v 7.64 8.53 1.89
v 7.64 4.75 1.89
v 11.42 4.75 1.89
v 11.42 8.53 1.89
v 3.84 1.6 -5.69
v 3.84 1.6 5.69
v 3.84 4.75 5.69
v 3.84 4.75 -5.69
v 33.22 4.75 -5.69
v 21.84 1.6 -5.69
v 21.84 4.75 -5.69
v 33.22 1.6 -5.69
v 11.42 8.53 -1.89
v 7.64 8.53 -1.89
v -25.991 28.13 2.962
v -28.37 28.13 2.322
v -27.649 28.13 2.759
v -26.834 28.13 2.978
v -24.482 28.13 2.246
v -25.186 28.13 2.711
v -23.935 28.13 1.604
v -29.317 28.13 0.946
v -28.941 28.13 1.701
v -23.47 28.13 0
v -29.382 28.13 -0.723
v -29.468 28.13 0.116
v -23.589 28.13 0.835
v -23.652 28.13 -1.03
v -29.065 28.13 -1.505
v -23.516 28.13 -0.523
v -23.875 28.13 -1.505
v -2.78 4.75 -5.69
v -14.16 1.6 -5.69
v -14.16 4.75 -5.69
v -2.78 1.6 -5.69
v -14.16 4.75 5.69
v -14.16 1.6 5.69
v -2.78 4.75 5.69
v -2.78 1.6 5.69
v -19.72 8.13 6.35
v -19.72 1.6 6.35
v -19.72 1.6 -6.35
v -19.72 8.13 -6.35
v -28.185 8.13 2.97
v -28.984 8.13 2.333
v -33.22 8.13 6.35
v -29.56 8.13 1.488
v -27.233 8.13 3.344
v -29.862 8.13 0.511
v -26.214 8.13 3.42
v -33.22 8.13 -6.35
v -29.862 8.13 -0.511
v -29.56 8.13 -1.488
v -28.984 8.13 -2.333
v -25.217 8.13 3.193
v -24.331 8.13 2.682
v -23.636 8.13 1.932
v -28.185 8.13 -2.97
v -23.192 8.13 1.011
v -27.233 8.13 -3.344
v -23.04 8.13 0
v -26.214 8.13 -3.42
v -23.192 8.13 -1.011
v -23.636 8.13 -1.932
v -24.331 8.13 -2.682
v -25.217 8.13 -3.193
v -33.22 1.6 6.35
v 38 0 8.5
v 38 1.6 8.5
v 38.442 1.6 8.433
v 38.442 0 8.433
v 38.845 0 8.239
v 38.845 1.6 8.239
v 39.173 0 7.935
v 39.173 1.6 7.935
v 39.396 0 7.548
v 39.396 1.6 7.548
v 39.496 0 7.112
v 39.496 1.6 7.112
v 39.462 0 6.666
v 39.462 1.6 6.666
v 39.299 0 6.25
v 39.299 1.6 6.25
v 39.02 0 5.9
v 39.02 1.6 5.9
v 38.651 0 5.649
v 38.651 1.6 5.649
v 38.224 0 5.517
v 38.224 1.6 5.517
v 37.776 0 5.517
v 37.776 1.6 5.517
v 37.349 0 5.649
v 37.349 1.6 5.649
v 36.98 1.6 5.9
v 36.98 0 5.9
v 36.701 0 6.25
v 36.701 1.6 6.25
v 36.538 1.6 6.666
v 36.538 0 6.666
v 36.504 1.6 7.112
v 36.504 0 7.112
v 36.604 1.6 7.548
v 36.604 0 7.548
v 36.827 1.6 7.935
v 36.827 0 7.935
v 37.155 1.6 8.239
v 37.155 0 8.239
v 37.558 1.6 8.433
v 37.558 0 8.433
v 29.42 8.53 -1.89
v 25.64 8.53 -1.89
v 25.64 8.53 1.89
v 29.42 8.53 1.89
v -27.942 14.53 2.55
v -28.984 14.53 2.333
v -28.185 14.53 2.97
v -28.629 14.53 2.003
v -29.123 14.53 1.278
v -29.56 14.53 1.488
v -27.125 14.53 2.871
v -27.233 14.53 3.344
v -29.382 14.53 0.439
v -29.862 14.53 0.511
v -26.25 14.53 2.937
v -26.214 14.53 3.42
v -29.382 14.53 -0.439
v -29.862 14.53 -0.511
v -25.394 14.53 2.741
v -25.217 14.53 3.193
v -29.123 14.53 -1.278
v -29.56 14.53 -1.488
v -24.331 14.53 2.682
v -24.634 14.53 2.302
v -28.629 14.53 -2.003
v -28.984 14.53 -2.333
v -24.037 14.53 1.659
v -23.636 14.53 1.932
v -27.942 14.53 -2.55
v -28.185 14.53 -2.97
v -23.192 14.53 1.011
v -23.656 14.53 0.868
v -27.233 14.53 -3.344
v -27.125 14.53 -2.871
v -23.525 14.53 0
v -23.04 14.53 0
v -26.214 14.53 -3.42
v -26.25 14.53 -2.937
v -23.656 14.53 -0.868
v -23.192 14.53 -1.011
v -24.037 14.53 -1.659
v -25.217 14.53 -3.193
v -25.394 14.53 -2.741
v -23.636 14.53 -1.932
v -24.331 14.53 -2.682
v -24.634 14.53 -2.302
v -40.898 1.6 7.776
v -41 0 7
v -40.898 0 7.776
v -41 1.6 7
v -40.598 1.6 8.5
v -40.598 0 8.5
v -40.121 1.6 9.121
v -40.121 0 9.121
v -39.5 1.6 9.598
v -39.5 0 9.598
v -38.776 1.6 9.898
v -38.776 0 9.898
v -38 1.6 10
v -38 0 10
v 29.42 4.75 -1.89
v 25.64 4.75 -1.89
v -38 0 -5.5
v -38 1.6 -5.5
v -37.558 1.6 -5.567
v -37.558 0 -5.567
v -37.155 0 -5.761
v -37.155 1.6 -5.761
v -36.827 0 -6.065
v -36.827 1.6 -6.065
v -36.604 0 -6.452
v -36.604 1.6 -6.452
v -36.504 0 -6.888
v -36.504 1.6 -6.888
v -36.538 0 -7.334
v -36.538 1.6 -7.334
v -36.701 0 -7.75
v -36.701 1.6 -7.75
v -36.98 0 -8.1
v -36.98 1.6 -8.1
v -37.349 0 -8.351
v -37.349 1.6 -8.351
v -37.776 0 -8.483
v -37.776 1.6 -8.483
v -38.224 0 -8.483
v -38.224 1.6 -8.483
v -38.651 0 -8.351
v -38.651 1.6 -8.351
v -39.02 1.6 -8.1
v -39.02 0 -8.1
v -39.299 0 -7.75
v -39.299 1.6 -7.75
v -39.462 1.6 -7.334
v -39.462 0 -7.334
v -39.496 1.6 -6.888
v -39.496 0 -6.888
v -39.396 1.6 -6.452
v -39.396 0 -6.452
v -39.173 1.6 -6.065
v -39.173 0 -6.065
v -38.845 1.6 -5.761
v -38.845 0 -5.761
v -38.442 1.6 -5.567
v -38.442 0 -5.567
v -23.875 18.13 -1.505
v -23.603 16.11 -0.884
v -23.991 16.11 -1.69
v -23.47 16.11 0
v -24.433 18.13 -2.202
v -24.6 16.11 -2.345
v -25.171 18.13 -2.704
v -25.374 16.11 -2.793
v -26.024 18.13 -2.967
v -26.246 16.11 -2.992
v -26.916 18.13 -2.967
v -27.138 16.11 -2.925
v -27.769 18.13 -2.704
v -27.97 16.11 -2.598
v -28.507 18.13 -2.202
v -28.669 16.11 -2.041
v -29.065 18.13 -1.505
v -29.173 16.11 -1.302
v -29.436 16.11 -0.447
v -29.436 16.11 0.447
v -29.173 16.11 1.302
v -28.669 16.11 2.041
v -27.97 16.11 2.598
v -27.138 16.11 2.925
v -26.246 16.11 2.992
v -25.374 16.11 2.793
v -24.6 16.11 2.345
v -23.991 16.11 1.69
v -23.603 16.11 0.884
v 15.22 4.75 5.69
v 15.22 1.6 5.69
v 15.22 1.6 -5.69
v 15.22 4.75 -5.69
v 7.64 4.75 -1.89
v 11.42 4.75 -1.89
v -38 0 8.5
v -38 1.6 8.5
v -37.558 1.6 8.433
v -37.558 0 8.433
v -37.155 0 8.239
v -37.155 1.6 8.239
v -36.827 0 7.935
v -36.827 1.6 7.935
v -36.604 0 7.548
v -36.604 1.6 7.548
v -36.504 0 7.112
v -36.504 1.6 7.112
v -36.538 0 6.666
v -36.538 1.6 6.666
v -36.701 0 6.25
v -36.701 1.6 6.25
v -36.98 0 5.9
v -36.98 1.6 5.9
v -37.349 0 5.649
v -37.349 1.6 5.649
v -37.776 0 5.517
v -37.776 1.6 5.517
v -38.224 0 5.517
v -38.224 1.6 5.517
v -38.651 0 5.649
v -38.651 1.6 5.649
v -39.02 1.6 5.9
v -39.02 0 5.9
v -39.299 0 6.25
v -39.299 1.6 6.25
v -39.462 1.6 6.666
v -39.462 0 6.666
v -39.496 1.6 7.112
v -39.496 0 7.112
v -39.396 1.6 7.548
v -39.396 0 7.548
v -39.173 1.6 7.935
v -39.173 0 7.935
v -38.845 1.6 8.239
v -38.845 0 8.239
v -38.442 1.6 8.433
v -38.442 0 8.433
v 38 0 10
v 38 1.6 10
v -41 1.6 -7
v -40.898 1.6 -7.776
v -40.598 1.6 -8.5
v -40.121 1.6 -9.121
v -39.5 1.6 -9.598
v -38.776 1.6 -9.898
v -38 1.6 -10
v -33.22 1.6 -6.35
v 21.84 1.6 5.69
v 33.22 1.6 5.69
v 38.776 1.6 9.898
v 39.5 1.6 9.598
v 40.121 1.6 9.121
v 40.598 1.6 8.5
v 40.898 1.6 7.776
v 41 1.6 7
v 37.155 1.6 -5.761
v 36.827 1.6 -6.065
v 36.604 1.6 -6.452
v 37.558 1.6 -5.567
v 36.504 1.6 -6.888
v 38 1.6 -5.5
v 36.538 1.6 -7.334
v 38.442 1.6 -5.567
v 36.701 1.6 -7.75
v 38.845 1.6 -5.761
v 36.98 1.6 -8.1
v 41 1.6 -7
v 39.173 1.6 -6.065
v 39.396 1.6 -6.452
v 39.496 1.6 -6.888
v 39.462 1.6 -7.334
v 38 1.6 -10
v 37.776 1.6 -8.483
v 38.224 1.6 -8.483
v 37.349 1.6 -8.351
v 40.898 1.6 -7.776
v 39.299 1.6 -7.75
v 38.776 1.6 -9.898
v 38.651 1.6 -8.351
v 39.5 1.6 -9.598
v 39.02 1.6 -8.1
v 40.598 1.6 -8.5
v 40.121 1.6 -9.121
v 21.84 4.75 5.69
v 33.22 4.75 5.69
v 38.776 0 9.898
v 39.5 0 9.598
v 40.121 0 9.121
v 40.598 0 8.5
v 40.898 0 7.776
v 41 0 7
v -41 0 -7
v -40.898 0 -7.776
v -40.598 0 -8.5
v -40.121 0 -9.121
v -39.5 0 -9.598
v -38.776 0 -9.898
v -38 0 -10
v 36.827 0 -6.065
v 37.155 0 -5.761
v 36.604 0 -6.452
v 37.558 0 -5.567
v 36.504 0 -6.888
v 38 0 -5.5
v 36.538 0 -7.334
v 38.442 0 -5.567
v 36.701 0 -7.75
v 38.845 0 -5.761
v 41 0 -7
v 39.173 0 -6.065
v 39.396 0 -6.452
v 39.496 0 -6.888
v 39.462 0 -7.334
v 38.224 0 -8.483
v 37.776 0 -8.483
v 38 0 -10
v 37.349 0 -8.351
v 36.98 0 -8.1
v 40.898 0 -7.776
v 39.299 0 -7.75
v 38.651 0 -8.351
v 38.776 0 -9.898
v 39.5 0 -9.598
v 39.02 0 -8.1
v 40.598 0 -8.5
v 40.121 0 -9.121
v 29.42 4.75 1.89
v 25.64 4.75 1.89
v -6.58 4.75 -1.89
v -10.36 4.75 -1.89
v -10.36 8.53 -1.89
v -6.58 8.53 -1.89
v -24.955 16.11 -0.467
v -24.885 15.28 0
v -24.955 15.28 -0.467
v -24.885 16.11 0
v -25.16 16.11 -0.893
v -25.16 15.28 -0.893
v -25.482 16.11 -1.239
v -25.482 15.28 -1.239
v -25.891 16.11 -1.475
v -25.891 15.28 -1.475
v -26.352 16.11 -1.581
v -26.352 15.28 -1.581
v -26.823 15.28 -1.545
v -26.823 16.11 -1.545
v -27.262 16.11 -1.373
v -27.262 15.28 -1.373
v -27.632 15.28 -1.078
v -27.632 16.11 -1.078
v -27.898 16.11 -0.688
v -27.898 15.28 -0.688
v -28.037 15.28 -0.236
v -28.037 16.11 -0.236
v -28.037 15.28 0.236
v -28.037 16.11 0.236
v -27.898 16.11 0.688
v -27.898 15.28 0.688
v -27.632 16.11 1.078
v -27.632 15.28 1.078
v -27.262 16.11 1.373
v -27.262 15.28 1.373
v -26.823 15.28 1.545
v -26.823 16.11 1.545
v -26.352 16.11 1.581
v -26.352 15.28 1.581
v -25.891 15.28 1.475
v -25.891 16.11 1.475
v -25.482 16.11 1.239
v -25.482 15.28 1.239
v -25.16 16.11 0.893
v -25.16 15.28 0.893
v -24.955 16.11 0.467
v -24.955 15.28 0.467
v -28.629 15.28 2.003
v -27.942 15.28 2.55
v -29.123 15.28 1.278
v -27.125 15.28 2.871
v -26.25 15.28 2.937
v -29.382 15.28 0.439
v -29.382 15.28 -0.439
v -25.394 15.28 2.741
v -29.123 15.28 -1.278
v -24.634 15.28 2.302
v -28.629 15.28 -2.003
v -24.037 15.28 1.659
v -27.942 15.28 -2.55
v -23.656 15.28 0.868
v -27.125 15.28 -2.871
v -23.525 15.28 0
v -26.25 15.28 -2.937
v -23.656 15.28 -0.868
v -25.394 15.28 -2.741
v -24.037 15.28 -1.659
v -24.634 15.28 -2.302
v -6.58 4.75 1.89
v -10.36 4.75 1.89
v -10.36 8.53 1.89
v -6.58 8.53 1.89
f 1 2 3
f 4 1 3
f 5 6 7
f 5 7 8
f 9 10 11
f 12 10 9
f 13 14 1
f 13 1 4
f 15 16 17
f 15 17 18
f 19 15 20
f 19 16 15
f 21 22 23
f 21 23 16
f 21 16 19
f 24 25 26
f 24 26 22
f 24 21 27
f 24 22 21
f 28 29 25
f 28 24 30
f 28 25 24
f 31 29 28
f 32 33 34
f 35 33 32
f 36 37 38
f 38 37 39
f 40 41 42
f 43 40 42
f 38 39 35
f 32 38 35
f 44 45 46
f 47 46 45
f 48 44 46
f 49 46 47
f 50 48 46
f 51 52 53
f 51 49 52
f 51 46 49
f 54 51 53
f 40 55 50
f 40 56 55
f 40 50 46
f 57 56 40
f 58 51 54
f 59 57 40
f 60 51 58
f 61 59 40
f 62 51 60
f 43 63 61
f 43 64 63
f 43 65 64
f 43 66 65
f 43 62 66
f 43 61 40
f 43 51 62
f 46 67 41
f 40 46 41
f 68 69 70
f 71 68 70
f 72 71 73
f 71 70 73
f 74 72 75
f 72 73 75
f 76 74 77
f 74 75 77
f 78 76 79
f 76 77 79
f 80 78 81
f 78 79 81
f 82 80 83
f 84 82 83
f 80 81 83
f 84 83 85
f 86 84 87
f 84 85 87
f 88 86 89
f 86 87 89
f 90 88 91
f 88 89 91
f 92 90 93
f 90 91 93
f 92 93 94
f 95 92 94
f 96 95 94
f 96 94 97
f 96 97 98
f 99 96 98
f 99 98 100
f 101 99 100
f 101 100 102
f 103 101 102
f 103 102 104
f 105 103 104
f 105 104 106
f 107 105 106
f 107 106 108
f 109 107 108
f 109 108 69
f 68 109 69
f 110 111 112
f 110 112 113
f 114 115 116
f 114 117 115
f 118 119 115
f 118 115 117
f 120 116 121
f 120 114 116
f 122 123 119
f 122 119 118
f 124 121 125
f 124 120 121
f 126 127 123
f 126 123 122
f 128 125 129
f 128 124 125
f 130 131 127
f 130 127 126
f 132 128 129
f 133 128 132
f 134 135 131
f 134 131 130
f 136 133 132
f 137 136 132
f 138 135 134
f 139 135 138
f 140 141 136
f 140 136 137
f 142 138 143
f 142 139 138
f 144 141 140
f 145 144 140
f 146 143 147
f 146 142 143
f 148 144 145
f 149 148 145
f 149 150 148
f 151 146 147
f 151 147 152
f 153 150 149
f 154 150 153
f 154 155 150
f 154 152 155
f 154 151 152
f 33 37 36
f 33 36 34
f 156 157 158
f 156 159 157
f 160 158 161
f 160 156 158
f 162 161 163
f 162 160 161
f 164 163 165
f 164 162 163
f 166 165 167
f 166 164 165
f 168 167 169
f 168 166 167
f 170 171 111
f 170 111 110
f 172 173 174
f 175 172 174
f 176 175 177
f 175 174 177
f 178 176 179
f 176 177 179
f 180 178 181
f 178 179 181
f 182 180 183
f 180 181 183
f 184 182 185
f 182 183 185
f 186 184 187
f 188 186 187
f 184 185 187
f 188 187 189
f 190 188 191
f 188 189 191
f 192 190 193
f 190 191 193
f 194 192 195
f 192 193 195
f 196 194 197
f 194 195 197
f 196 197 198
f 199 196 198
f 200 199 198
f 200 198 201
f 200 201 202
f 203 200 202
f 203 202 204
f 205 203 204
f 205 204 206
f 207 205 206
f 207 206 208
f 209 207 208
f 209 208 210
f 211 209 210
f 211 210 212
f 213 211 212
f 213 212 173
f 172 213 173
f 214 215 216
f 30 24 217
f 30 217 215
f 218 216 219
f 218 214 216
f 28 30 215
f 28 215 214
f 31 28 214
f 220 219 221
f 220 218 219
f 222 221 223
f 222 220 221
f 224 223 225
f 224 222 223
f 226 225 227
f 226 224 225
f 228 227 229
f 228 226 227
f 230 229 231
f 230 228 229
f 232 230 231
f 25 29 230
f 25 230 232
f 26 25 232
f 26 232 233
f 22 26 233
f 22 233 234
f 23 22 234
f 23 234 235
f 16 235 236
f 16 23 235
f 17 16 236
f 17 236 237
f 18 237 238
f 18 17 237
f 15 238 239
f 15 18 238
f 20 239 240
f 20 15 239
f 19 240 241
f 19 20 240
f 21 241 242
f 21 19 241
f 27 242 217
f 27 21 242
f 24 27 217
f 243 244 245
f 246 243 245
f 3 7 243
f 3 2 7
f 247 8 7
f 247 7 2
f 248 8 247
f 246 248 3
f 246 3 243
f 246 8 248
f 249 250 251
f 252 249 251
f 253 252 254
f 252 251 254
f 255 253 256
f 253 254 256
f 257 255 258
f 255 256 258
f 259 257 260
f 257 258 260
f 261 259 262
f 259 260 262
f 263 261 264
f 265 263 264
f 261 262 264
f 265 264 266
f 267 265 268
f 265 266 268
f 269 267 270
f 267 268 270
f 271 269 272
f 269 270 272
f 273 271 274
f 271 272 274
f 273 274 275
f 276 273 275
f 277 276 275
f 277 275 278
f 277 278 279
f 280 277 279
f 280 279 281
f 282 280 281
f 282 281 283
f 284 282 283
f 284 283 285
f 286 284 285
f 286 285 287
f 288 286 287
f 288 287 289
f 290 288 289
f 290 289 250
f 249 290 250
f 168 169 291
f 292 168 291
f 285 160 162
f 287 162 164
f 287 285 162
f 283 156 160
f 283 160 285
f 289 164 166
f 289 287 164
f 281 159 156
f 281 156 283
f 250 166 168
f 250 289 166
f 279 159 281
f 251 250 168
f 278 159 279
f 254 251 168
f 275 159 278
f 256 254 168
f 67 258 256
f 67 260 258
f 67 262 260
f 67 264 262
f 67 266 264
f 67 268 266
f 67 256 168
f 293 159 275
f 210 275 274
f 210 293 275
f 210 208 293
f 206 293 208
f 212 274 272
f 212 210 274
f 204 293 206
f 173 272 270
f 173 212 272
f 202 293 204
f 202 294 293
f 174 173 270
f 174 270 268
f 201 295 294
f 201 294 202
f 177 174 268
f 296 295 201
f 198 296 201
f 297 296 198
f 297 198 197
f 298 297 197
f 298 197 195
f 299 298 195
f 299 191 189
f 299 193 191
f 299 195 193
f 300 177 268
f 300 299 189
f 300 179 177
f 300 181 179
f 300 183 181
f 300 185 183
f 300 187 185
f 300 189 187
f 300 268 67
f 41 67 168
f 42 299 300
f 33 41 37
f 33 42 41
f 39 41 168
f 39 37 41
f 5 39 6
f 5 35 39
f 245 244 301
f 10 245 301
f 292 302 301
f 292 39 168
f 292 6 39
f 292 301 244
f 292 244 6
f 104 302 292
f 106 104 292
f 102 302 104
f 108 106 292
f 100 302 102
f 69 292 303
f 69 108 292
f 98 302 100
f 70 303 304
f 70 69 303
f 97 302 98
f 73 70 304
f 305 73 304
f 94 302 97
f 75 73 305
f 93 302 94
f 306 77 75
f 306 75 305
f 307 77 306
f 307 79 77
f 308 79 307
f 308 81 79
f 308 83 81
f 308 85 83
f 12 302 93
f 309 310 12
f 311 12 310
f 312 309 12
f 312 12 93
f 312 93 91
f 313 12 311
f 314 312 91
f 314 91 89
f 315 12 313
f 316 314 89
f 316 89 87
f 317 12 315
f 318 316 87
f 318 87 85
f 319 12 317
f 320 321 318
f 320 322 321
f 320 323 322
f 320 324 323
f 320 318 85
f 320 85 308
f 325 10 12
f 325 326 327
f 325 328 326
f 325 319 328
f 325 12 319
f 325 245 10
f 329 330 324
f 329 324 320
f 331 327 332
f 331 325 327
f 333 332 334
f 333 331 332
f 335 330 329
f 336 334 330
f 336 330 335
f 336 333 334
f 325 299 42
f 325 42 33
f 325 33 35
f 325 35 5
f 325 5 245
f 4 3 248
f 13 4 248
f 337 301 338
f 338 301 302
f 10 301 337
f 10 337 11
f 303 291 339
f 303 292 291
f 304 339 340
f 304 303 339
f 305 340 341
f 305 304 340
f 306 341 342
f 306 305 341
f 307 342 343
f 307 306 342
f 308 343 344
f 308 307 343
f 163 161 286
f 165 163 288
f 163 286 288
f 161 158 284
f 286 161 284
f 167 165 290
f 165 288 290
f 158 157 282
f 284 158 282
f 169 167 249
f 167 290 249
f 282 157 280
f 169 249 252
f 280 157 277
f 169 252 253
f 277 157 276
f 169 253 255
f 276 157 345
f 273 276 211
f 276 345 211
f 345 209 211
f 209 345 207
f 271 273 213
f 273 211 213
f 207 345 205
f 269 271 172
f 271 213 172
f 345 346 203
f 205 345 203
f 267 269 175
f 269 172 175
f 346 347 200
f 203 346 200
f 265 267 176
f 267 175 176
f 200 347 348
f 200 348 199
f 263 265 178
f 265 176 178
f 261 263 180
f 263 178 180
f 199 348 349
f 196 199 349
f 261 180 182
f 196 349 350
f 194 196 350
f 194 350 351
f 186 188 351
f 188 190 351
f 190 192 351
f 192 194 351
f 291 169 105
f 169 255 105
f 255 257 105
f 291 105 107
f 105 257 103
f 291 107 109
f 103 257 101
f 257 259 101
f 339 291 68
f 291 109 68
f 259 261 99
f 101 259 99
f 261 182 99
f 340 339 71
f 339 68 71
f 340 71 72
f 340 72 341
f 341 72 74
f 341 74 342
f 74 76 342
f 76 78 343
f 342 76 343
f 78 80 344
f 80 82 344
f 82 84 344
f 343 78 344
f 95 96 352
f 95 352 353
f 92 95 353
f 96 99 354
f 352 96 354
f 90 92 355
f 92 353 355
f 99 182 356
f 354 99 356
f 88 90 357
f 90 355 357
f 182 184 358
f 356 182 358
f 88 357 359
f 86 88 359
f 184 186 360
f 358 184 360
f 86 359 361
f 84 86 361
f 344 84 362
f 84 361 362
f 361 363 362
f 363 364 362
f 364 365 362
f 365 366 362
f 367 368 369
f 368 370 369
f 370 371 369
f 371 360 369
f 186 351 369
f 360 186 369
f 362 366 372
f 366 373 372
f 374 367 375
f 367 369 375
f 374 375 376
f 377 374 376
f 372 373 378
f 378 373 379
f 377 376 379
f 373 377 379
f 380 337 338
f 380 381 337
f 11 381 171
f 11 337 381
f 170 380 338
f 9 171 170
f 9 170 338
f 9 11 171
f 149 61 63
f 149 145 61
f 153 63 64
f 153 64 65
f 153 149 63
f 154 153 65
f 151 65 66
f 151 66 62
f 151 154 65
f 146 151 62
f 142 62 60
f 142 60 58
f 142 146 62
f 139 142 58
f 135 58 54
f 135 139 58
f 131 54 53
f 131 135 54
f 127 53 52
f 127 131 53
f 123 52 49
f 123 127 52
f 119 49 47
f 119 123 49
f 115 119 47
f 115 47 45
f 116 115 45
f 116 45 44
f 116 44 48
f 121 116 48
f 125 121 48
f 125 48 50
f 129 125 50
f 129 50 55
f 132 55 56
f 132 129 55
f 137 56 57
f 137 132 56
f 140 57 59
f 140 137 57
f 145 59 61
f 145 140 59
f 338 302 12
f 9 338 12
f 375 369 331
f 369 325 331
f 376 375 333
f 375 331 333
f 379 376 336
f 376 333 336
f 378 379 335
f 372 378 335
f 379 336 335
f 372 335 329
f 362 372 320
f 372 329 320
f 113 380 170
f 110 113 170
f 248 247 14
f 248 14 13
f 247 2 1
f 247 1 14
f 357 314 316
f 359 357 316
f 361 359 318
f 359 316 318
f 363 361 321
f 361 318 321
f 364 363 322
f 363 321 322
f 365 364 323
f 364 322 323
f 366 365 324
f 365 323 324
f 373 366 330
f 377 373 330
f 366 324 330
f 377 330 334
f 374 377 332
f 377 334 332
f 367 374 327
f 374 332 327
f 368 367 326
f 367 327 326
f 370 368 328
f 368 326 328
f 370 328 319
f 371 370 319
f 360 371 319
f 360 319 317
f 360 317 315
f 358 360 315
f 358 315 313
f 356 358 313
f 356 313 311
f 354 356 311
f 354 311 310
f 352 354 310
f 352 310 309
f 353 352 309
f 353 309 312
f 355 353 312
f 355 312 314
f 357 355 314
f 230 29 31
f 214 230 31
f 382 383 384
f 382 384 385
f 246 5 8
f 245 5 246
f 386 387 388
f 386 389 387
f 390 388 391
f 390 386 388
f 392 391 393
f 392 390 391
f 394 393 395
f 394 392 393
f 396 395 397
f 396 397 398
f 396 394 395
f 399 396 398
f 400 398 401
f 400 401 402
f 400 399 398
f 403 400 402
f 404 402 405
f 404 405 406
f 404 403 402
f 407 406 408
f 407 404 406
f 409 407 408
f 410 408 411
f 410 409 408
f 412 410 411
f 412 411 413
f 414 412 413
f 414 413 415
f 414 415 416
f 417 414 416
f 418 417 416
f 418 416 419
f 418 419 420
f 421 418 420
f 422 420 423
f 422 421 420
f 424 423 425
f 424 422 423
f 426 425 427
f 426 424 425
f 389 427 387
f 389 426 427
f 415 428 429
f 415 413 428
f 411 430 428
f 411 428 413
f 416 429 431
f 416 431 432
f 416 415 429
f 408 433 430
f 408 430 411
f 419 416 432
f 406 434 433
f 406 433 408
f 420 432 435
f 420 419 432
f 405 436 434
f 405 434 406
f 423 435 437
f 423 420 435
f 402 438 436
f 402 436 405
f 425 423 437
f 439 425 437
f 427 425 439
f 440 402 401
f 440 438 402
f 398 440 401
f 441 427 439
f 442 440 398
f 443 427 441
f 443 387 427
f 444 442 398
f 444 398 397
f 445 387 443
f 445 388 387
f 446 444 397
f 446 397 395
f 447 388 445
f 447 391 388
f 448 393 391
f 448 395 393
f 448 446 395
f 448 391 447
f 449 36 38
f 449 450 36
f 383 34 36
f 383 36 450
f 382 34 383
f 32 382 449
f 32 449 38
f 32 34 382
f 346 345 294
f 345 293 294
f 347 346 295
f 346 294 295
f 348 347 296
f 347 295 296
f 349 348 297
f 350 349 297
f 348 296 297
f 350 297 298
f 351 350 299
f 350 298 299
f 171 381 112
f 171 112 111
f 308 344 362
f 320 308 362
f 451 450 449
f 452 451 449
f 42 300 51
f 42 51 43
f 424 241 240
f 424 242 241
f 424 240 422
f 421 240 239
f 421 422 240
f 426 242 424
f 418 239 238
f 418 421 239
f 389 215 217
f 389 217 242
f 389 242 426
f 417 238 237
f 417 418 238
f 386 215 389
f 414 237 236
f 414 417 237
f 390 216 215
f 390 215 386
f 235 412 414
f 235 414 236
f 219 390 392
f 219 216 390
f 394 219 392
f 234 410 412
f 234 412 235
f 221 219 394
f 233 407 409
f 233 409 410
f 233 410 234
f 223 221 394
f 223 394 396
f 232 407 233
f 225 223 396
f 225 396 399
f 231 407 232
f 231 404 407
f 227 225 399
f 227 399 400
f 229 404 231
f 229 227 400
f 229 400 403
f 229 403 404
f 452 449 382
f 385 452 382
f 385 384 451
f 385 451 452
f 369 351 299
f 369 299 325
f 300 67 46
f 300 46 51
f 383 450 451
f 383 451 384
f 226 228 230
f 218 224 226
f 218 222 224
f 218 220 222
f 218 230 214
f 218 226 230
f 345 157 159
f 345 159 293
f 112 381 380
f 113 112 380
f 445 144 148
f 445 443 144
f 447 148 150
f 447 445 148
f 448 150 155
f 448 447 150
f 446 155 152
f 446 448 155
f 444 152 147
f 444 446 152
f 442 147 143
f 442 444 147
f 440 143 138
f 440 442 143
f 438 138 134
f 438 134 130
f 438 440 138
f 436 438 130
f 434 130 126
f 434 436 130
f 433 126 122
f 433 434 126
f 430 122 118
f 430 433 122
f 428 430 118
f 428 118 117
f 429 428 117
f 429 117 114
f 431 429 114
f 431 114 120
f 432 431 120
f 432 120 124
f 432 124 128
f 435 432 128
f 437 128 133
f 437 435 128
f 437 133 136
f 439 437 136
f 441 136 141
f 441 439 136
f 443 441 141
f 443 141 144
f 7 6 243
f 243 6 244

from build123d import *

# Parameters (mm, degrees)
SKETCH1_W           = 82
SKETCH1_H           = 20
BOSS_EXTRUDE1_DEPTH = 1.6
SKETCH2_W           = 11.38
SKETCH2_H           = 11.38
BOSS_EXTRUDE2_DEPTH = 3.15
SKETCH2_3_W         = 13.5
SKETCH2_3_H         = 12.7
BOSS_EXTRUDE3_DEPTH = 6.53
SKETCH3_W           = 3.78
SKETCH3_H           = 3.78
BOSS_EXTRUDE4_DEPTH = 3.78
SKETCH5_W           = 5.190366076
SKETCH5_H           = 1.495
CUT_EXTRUDE1_DEPTH  = 10
SKETCH6_R           = 1.5
CUT_EXTRUDE2_DEPTH  = 50.848178502
FILLET1_R           = 3


with BuildPart() as part:
    # Sketch1 → Boss-Extrude1 (new body)
    with BuildSketch(Plane(origin=(0, 0, 0), x_dir=(1, 0, 0), z_dir=(0, 1, 0))):
        Rectangle(SKETCH1_W, SKETCH1_H)
    extrude(amount=BOSS_EXTRUDE1_DEPTH)

    # Sketch2 → Boss-Extrude2 (add)
    with BuildSketch(Plane(origin=(0, 1.6, 0), x_dir=(1, 0, 0), z_dir=(0, 1, 0))):
        with Locations((27.53, 0)):
            Rectangle(SKETCH2_W, SKETCH2_H)
        with Locations((9.53, 0)):
            Rectangle(SKETCH2_W, SKETCH2_H)
        with Locations((-8.47, 0)):
            Rectangle(SKETCH2_W, SKETCH2_H)
    extrude(amount=BOSS_EXTRUDE2_DEPTH)

    # Sketch2<3> → Boss-Extrude3 (add)
    with BuildSketch(Plane(origin=(0, 1.6, 0), x_dir=(1, 0, 0), z_dir=(0, 1, 0))):
        with Locations((-26.47, 0)):
            Rectangle(SKETCH2_3_W, SKETCH2_3_H)
    extrude(amount=BOSS_EXTRUDE3_DEPTH)

    # Sketch3 → Boss-Extrude4 (add)
    with BuildSketch(Plane(origin=(0, 4.75, 0), x_dir=(1, 0, 0), z_dir=(0, 1, 0))):
        with Locations((-8.47, 0)):
            Rectangle(SKETCH3_W, SKETCH3_H)
        with Locations((9.53, 0)):
            Rectangle(SKETCH3_W, SKETCH3_H)
        with Locations((27.53, 0)):
            Rectangle(SKETCH3_W, SKETCH3_H)
    extrude(amount=BOSS_EXTRUDE4_DEPTH)

    # Sketch4 → Revolve1 (revolve)
    with BuildSketch(Plane.XY):
        Polygon((-23.04, 8.13), (-23.04, 14.53), (-23.525, 14.53), (-23.525, 15.28), (-24.885, 15.28), (-24.885, 16.11), (-23.47, 16.11), (-23.47, 28.13), (-26.47, 28.13), (-26.47, 8.13), align=None)
    revolve(axis=Axis((-26.47, 8.13, 0), (0, 1, 0)))

    # Sketch5 → Cut-Extrude1 (cut)
    with BuildSketch(Plane(origin=(0, 28.13, 0), x_dir=(1, 0, 0), z_dir=(0, 1, 0))):
        with Locations((-26.47, 2.2525)):
            Rectangle(SKETCH5_W, SKETCH5_H)
    extrude(amount=-CUT_EXTRUDE1_DEPTH, mode=Mode.SUBTRACT)

    # Sketch6 → Cut-Extrude2 (cut, through all)
    with BuildSketch(Plane(origin=(0, 1.6, 0), x_dir=(1, 0, 0), z_dir=(0, 1, 0))):
        with Locations((-38, 7)):
            Circle(SKETCH6_R)
        with Locations((-38, -7)):
            Circle(SKETCH6_R)
        with Locations((38, -7)):
            Circle(SKETCH6_R)
        with Locations((38, 7)):
            Circle(SKETCH6_R)
    extrude(amount=-CUT_EXTRUDE2_DEPTH, mode=Mode.SUBTRACT)

    # Fillet1
    fillet1_edges = [part.edges().sort_by_distance(p)[0] for p in [
        (41, 0.8, 10),
        (41, 0.8, -10),
        (-41, 0.8, 10),
        (-41, 0.8, -10),
    ]]
    fillet(fillet1_edges, radius=FILLET1_R)


solid = part.part
